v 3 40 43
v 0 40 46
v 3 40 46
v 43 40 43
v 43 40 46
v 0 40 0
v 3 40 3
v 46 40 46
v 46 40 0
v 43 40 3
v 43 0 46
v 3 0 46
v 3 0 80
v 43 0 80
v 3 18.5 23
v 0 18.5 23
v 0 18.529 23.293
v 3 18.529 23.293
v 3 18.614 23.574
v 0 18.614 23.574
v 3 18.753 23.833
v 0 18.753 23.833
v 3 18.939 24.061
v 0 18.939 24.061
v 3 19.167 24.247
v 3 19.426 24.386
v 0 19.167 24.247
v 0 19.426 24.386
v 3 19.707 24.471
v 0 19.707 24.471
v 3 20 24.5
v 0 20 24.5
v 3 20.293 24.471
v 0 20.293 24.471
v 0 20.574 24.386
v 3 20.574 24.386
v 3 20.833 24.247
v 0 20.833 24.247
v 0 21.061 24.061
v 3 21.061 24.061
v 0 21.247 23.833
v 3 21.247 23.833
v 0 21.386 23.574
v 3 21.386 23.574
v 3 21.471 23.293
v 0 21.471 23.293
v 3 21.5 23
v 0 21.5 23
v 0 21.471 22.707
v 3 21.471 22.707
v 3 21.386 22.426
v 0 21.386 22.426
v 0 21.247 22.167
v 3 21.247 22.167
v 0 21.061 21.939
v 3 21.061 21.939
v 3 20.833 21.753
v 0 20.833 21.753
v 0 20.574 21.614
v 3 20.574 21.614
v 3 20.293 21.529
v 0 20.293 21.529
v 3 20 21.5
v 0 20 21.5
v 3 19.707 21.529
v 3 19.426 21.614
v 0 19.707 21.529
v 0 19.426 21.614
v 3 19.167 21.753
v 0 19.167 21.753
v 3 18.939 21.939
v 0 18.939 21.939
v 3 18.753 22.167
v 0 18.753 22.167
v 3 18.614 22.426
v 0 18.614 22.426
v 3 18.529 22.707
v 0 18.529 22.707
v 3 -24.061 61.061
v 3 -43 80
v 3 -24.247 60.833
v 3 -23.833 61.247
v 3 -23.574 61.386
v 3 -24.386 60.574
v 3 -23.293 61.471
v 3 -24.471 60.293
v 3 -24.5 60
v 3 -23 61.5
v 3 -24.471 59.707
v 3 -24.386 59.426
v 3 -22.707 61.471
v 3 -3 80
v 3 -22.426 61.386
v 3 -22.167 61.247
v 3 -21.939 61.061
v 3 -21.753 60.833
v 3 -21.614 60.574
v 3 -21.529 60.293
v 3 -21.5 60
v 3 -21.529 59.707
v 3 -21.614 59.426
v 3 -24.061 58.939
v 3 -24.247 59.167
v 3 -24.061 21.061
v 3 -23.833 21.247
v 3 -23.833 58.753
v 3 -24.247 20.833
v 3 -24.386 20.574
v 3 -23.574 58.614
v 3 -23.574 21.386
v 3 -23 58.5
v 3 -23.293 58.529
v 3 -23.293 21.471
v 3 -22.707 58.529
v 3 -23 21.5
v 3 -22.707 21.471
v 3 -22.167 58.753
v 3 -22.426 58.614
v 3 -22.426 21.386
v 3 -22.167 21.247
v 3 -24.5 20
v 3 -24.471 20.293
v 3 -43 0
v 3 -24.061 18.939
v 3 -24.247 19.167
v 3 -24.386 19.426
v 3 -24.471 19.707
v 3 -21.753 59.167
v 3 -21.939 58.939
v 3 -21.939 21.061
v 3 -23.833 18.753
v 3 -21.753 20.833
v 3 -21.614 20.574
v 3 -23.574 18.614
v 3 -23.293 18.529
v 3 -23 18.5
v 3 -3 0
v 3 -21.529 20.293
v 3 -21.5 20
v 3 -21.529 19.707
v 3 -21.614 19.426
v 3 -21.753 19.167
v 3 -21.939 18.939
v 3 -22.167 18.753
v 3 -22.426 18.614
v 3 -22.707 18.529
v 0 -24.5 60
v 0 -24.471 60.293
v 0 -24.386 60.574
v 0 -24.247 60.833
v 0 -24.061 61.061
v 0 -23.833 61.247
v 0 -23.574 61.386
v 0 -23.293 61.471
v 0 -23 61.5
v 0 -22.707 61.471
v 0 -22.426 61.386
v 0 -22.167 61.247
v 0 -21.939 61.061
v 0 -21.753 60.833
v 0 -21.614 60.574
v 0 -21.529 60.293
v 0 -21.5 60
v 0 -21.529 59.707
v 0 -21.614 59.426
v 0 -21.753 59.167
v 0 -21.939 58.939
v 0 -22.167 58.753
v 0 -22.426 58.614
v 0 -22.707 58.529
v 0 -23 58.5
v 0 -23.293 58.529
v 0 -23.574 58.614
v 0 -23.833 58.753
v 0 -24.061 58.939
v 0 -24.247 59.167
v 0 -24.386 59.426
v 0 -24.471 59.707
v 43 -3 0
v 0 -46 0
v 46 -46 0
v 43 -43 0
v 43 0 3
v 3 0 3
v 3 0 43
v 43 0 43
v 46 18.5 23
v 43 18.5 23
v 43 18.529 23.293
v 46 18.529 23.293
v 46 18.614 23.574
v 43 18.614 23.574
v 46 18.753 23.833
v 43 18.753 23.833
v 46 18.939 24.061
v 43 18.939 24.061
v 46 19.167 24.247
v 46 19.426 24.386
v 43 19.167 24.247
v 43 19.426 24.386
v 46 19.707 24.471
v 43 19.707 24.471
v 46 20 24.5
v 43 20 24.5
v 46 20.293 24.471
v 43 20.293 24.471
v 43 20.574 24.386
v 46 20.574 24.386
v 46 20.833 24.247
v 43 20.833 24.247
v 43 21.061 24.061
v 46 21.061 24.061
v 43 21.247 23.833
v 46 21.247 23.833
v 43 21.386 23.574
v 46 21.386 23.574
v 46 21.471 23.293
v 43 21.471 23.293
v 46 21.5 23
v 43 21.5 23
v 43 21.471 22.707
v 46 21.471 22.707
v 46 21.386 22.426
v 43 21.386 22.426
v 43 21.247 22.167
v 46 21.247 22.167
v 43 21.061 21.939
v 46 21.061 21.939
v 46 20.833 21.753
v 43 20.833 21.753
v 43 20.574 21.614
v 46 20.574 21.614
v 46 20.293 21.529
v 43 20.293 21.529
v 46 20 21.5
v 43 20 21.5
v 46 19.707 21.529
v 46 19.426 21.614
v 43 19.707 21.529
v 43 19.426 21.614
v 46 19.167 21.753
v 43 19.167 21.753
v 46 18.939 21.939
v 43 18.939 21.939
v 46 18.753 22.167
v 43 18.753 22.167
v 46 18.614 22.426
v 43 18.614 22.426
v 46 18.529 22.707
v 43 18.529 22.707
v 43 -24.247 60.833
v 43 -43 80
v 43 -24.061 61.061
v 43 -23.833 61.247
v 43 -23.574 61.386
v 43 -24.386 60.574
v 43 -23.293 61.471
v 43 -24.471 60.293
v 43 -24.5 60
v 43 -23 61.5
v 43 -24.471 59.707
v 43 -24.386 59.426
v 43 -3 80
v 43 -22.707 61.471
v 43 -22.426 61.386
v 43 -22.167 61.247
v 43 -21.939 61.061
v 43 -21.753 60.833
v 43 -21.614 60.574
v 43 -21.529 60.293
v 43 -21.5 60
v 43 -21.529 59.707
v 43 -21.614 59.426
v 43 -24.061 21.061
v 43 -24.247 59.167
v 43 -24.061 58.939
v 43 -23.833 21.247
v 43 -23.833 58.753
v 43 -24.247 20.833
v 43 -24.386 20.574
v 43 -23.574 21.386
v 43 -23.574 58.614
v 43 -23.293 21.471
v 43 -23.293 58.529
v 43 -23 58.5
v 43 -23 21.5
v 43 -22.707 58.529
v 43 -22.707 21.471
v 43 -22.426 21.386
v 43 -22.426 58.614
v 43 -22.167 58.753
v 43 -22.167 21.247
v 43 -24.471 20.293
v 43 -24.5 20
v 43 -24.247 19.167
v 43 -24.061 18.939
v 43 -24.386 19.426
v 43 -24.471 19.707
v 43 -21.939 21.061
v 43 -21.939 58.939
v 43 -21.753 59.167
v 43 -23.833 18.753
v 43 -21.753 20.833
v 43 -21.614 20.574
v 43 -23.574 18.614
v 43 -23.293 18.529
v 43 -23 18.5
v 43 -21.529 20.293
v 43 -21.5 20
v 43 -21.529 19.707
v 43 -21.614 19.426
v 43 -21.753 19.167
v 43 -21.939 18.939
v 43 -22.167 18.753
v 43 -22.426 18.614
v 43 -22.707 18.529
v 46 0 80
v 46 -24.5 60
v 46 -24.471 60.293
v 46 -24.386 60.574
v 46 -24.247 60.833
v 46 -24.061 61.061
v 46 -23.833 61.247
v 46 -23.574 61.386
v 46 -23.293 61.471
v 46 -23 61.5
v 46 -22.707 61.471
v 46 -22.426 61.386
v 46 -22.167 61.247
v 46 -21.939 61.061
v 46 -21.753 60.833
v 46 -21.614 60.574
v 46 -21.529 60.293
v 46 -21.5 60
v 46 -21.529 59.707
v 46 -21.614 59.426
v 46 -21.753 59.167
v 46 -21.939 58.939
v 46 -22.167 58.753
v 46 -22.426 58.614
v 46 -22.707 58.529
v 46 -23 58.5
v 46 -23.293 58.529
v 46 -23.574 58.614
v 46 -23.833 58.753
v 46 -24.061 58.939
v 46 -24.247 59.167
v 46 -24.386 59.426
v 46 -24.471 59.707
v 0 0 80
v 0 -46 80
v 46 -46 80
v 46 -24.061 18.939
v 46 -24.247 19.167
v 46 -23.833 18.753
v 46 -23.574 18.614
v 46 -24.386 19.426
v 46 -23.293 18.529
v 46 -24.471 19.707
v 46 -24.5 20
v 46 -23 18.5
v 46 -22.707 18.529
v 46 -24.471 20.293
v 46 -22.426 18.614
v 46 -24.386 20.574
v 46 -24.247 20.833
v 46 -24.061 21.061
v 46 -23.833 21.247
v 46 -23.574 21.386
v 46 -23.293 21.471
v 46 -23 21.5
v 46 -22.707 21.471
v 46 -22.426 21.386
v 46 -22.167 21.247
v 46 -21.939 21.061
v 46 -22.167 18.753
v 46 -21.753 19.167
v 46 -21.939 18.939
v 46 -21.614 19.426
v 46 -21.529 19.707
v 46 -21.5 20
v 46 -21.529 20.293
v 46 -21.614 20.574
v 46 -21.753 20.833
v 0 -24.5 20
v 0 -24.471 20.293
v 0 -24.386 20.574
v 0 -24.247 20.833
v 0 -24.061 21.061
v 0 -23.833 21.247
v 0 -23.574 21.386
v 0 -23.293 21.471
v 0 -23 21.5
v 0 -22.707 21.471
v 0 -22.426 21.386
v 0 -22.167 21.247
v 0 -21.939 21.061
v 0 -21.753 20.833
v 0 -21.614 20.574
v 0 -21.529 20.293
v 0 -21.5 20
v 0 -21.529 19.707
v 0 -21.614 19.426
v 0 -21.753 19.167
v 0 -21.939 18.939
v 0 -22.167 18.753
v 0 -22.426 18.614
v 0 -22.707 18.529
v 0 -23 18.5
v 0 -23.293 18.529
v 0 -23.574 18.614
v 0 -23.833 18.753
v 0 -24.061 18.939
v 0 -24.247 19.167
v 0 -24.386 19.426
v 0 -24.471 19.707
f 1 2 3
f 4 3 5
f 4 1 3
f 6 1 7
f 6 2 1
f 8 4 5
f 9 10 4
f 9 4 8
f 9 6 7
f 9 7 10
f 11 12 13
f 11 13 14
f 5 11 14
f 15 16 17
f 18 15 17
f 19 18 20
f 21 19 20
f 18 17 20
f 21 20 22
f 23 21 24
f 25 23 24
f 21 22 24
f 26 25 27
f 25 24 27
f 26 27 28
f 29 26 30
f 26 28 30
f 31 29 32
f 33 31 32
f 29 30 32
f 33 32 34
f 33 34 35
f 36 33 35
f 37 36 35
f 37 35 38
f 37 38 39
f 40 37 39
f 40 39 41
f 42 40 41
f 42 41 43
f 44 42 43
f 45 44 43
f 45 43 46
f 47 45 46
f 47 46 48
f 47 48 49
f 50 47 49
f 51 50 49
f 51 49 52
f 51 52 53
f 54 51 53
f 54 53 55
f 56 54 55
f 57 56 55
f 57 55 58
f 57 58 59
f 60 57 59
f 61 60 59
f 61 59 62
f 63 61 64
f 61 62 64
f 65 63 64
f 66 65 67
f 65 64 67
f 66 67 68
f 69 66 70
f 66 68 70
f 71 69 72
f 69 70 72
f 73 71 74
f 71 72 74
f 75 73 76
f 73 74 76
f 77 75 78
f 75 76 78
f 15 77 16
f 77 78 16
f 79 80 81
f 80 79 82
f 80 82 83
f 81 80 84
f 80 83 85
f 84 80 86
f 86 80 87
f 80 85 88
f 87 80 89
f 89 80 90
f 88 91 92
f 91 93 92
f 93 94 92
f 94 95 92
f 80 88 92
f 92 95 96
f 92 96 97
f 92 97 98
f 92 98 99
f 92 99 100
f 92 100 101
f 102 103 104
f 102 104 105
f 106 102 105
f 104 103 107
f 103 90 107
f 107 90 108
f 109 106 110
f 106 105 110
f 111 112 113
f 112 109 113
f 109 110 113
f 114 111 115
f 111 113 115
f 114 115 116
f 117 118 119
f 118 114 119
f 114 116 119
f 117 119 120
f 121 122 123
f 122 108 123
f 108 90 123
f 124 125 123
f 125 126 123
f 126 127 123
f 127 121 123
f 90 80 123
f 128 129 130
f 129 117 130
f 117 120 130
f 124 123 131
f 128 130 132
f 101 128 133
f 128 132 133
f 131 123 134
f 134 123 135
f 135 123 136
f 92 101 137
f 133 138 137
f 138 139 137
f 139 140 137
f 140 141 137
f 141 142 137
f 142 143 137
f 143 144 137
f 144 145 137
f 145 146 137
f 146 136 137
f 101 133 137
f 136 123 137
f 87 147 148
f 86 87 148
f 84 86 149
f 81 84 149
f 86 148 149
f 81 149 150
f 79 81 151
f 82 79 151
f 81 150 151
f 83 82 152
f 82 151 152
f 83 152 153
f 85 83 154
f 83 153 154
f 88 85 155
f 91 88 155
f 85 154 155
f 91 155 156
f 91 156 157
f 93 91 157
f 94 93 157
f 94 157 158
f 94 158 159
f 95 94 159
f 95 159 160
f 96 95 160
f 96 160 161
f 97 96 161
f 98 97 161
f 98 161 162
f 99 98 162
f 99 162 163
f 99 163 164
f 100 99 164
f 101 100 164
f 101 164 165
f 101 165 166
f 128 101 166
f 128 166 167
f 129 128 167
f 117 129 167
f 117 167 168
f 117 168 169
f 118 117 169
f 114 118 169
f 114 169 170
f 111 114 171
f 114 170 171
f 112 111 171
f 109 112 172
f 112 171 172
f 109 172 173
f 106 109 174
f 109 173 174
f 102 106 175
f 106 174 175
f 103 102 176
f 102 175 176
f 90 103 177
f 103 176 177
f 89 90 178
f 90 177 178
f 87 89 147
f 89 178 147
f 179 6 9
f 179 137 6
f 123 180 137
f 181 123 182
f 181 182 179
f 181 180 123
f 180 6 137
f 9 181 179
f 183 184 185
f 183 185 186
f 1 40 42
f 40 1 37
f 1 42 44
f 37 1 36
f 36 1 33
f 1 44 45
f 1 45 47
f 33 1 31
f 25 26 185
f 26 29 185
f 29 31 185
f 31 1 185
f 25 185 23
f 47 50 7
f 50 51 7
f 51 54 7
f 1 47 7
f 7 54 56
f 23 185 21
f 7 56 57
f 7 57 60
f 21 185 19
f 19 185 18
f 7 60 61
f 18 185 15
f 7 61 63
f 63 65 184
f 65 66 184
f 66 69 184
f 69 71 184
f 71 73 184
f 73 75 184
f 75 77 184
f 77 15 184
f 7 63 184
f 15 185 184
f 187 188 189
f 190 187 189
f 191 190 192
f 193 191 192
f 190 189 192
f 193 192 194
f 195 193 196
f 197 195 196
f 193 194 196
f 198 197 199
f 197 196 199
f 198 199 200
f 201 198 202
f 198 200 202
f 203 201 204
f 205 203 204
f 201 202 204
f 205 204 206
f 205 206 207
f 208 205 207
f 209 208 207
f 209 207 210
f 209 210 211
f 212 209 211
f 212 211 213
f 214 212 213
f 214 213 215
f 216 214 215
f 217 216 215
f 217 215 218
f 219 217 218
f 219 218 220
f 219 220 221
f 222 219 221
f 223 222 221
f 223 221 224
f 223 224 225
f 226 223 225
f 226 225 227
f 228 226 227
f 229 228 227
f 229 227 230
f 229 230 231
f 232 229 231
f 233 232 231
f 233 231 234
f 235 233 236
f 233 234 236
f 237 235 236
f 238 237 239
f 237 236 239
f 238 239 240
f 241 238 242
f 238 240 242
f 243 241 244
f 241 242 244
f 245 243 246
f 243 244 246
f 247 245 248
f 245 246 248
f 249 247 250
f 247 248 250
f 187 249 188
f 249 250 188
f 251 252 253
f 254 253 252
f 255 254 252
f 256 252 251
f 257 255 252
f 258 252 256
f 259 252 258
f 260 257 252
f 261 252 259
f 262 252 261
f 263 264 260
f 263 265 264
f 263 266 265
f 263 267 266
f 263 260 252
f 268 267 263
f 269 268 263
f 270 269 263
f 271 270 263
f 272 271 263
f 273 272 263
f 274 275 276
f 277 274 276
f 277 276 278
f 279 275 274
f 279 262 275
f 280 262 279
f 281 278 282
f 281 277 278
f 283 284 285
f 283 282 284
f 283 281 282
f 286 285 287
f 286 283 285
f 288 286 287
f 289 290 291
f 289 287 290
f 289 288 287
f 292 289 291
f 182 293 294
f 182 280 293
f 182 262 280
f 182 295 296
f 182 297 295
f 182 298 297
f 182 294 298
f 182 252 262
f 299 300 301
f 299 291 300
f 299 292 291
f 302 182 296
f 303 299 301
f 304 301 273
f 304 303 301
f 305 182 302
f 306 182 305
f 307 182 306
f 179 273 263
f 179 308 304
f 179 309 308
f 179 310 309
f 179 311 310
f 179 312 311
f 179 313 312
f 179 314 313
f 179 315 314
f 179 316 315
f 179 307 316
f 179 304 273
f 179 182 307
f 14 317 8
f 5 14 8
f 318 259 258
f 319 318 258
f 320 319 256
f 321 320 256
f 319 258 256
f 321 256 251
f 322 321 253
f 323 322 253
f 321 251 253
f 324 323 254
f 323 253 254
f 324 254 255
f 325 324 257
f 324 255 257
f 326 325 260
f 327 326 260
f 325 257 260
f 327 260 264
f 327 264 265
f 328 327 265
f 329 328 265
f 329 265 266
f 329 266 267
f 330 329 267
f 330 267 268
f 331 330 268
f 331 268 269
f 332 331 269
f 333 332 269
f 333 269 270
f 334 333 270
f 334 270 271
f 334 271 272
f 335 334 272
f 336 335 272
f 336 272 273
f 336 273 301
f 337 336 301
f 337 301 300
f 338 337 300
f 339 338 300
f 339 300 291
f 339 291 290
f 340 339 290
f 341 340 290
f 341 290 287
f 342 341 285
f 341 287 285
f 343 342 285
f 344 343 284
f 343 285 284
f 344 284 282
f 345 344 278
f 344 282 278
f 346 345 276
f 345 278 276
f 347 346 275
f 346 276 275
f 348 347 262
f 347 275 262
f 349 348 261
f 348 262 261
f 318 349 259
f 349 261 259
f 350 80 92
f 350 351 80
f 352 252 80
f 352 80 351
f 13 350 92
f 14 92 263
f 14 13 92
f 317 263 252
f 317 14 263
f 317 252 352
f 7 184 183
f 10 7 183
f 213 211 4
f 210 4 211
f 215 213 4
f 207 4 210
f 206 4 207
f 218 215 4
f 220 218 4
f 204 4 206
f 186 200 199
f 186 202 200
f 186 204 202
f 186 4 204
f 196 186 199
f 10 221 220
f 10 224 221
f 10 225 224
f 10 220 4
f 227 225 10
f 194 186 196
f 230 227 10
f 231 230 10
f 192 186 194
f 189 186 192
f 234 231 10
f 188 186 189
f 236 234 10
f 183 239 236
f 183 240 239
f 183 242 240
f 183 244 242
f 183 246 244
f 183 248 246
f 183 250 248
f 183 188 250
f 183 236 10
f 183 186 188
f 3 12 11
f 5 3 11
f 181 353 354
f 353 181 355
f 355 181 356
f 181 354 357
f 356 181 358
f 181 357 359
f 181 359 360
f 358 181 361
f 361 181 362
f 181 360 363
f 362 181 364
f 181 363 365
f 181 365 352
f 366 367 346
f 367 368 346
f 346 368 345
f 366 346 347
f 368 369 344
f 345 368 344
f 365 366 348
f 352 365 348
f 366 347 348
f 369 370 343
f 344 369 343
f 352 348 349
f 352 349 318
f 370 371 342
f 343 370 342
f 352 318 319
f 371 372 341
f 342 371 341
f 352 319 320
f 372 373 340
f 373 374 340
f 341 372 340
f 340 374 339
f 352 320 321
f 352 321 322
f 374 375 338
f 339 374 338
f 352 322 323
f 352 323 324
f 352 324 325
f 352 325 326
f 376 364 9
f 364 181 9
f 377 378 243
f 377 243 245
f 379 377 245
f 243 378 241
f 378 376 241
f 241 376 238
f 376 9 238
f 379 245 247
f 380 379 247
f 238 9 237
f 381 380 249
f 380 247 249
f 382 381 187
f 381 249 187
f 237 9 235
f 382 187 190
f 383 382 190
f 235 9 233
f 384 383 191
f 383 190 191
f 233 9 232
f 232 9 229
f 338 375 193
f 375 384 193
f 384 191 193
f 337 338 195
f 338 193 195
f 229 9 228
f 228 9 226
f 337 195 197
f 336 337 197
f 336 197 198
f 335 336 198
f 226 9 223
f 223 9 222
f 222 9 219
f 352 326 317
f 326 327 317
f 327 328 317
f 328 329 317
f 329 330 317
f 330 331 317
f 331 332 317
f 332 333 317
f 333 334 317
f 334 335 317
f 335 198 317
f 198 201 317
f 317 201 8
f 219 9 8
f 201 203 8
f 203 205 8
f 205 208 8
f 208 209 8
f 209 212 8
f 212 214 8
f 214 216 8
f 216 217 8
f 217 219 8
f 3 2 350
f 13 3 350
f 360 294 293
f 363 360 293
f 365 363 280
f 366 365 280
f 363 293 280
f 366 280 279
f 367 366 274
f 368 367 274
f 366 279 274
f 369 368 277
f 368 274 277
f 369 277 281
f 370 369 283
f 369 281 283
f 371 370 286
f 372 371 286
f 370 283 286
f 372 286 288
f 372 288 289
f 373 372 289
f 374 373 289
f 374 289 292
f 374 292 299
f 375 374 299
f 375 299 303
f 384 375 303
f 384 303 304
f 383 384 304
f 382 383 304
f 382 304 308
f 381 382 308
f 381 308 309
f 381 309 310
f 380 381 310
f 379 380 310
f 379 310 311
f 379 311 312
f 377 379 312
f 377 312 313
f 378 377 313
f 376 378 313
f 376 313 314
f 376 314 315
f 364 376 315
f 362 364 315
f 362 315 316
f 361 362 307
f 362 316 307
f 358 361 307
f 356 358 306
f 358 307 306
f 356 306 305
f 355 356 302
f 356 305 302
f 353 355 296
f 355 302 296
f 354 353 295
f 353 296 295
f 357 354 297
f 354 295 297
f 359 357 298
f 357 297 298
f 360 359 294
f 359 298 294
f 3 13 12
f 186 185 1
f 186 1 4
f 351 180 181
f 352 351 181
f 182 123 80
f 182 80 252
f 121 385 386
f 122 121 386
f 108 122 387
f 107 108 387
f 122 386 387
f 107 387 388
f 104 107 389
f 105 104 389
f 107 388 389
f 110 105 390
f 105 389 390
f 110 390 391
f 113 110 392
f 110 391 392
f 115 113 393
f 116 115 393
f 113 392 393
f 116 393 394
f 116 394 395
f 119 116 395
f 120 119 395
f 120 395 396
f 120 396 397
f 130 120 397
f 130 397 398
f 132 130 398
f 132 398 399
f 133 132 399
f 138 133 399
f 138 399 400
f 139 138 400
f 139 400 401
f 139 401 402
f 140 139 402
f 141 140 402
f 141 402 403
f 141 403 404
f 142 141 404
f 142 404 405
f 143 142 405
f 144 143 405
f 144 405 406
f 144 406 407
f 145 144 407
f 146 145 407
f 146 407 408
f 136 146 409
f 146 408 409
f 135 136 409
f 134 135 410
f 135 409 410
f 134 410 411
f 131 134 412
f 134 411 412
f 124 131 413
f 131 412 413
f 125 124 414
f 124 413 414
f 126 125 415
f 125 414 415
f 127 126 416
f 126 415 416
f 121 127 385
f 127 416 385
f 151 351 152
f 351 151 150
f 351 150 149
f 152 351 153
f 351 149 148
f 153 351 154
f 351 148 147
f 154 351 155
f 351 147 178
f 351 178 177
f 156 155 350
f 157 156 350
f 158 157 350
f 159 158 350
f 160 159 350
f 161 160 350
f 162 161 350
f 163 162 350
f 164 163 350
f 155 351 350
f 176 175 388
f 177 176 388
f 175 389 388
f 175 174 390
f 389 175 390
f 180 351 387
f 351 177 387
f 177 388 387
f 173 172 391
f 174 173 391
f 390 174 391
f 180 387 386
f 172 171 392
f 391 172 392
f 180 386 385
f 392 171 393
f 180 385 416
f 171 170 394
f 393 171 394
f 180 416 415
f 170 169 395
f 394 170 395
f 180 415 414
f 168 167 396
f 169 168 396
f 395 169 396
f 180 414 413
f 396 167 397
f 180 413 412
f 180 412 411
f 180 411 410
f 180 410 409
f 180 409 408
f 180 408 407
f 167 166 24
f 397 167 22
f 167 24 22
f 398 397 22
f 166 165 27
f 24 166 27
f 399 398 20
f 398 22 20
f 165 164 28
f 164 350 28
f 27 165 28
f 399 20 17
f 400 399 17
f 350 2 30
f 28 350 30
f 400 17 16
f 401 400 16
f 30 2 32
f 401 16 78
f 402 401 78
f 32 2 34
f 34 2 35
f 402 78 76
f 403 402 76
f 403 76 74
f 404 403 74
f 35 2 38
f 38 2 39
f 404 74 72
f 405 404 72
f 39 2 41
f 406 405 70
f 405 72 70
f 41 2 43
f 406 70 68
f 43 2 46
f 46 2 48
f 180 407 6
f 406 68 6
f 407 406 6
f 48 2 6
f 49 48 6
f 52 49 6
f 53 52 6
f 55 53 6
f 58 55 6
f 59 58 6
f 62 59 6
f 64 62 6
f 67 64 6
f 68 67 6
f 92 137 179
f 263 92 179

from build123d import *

# Parameters (mm, degrees)
ESQUISSE1_W             = 46
ESQUISSE1_H             = 46
ESQUISSE1_W_2           = 40
ESQUISSE1_H_2           = 40
BOSS_EXTRU_1_DEPTH      = 80
ESQUISSE2_W             = 46
ESQUISSE2_H             = 46
ESQUISSE2_W_2           = 40
ESQUISSE2_H_2           = 40
BOSS_EXTRU_2_DEPTH      = 40
BOSS_EXTRU_3_DEPTH      = 3
BOSS_EXTRU_4_DEPTH      = 3
ESQUISSE5_R             = 1.5
ENL_V_MAT_EXTRU_1_DEPTH = 104.111590037


with BuildPart() as part:
    # Esquisse1 → Boss.-Extru.1 (new body)
    with BuildSketch(Plane.XY):
        with Locations((23, -23)):
            Rectangle(ESQUISSE1_W, ESQUISSE1_H)
        with Locations((23, -23)):
            Rectangle(ESQUISSE1_W_2, ESQUISSE1_H_2, mode=Mode.SUBTRACT)
    extrude(amount=BOSS_EXTRU_1_DEPTH)

    # Esquisse2 → Boss.-Extru.2 (add)
    with BuildSketch(Plane(origin=(0, 0, 0), x_dir=(1, 0, 0), z_dir=(0, 1, 0))):
        with Locations((23, -23)):
            Rectangle(ESQUISSE2_W, ESQUISSE2_H)
        with Locations((23, -23)):
            Rectangle(ESQUISSE2_W_2, ESQUISSE2_H_2, mode=Mode.SUBTRACT)
    extrude(amount=BOSS_EXTRU_2_DEPTH)

    # Esquisse3 → Boss.-Extru.3 (add)
    with BuildSketch(Plane(origin=(46, 0, 0), x_dir=(0, 0, -1), z_dir=(1, 0, 0))):
        Polygon((-80, 0), (-46, 40), (-46, 0), align=None)
    extrude(amount=-BOSS_EXTRU_3_DEPTH)

    # Esquisse4 → Boss.-Extru.4 (add)
    with BuildSketch(Plane.ZY):
        Polygon((46, 40), (80, 0), (46, 0), align=None)
    extrude(amount=-BOSS_EXTRU_4_DEPTH)

    # Esquisse5 → Enlèv. mat.-Extru.1 (cut, through all)
    with BuildSketch(Plane.ZY):
        with Locations(Location((23, 20, 0), (0, 0, 270))):
            Circle(ESQUISSE5_R)
        with Locations(Location((20, -23, 0), (0, 0, 270))):
            Circle(ESQUISSE5_R)
        with Locations(Location((60, -23, 0), (0, 0, 270))):
            Circle(ESQUISSE5_R)
    extrude(amount=-ENL_V_MAT_EXTRU_1_DEPTH, mode=Mode.SUBTRACT)


solid = part.part
